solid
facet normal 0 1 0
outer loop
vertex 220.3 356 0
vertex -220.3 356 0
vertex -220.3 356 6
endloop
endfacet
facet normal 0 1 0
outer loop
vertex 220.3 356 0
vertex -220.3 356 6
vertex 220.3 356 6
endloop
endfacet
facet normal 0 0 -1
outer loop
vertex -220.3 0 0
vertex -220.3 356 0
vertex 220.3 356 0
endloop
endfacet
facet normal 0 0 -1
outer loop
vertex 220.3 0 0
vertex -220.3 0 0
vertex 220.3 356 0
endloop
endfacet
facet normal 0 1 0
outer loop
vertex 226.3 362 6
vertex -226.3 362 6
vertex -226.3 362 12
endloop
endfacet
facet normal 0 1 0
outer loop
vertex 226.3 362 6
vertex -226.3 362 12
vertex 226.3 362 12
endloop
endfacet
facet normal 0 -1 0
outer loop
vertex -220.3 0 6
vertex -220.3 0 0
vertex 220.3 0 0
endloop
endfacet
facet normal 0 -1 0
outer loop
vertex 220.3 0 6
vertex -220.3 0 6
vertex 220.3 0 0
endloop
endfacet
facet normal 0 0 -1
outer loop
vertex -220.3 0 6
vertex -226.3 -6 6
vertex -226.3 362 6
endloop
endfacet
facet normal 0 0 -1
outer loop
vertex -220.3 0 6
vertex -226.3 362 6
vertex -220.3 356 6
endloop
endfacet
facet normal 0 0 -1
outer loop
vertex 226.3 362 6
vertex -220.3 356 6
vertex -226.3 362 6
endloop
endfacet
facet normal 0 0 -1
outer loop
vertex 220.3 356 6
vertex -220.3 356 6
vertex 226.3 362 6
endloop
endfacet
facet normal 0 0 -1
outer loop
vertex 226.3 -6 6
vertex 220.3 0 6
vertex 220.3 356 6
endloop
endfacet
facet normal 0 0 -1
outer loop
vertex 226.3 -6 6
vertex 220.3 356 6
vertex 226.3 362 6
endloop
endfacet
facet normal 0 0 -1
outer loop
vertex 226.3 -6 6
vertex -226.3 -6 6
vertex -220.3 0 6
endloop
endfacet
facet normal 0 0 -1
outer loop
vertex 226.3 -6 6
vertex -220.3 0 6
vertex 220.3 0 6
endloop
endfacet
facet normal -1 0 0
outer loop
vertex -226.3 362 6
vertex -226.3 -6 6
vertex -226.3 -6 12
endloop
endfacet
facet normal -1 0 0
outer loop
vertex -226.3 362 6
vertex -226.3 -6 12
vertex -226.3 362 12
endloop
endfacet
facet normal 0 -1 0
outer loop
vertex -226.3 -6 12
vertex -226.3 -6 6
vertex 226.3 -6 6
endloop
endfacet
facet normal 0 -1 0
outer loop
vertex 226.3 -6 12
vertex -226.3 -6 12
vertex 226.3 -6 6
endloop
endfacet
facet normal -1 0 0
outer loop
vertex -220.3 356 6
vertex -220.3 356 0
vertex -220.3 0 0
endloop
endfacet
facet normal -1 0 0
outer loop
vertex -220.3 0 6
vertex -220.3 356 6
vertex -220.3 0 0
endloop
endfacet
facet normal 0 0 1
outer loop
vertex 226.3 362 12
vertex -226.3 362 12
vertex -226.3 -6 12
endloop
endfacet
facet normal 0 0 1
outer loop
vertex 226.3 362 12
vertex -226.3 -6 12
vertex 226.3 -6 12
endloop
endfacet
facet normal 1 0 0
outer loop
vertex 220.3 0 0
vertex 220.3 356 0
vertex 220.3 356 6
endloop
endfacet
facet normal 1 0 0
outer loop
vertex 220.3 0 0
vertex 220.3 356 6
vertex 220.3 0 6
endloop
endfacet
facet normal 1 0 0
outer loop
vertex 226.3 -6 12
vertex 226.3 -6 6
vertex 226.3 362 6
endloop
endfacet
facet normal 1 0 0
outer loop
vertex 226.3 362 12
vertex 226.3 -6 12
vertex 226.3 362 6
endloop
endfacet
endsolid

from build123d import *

# Parameters (mm, degrees)
SKETCH072_W     = 452.6
SKETCH072_H     = 368
PAD026_DEPTH    = 12
SKETCH073_W     = 452.6
SKETCH073_H     = 6
POCKET044_DEPTH = 6
SKETCH074_W     = 452.6
SKETCH074_H     = 6
POCKET045_DEPTH = 6
SKETCH075_W     = 6
SKETCH075_H     = 356
POCKET046_DEPTH = 6


with BuildPart() as part:
    # Sketch072 → Pad026 (new body)
    with BuildSketch(Plane.XY):
        with Locations((0, 184)):
            Rectangle(SKETCH072_W, SKETCH072_H)
    extrude(amount=PAD026_DEPTH)

    # Sketch073 (on Face5 of Pad026) → Pocket044 (cut)
    with BuildSketch(Plane(origin=(0, 0, 0), x_dir=(1, 0, 0), z_dir=(0, 0, -1))):
        with Locations((0, -3)):
            Rectangle(SKETCH073_W, SKETCH073_H)
    extrude(amount=-POCKET044_DEPTH, mode=Mode.SUBTRACT)

    # Sketch074 (on Face4 of Pocket044) → Pocket045 (cut)
    with BuildSketch(Plane(origin=(0, 0, 0), x_dir=(1, 0, 0), z_dir=(0, 0, -1))):
        with Locations((0, -365)):
            Rectangle(SKETCH074_W, SKETCH074_H)
    extrude(amount=-POCKET045_DEPTH, mode=Mode.SUBTRACT)

    # Sketch075 (on Face7 of Pocket045) → Pocket046 (cut)
    with BuildSketch(Plane(origin=(0, 0, 0), x_dir=(1, 0, 0), z_dir=(0, 0, -1))):
        with Locations((-223.3, -184)):
            Rectangle(SKETCH075_W, SKETCH075_H)
    pocket046 = extrude(amount=-POCKET046_DEPTH, mode=Mode.SUBTRACT)

    # Mirrored017: Pocket046 across Sketch075 V_Axis
    add(pocket046.mirror(Plane(origin=(0, 0, 0), x_dir=(0, 0, -1), z_dir=(1, 0, 0))), mode=Mode.SUBTRACT)


with BuildPart() as part_1:
    # Body025 placement: moved
    add(part.part.moved(Location((0, -6, 0))))


solid = part_1.part
